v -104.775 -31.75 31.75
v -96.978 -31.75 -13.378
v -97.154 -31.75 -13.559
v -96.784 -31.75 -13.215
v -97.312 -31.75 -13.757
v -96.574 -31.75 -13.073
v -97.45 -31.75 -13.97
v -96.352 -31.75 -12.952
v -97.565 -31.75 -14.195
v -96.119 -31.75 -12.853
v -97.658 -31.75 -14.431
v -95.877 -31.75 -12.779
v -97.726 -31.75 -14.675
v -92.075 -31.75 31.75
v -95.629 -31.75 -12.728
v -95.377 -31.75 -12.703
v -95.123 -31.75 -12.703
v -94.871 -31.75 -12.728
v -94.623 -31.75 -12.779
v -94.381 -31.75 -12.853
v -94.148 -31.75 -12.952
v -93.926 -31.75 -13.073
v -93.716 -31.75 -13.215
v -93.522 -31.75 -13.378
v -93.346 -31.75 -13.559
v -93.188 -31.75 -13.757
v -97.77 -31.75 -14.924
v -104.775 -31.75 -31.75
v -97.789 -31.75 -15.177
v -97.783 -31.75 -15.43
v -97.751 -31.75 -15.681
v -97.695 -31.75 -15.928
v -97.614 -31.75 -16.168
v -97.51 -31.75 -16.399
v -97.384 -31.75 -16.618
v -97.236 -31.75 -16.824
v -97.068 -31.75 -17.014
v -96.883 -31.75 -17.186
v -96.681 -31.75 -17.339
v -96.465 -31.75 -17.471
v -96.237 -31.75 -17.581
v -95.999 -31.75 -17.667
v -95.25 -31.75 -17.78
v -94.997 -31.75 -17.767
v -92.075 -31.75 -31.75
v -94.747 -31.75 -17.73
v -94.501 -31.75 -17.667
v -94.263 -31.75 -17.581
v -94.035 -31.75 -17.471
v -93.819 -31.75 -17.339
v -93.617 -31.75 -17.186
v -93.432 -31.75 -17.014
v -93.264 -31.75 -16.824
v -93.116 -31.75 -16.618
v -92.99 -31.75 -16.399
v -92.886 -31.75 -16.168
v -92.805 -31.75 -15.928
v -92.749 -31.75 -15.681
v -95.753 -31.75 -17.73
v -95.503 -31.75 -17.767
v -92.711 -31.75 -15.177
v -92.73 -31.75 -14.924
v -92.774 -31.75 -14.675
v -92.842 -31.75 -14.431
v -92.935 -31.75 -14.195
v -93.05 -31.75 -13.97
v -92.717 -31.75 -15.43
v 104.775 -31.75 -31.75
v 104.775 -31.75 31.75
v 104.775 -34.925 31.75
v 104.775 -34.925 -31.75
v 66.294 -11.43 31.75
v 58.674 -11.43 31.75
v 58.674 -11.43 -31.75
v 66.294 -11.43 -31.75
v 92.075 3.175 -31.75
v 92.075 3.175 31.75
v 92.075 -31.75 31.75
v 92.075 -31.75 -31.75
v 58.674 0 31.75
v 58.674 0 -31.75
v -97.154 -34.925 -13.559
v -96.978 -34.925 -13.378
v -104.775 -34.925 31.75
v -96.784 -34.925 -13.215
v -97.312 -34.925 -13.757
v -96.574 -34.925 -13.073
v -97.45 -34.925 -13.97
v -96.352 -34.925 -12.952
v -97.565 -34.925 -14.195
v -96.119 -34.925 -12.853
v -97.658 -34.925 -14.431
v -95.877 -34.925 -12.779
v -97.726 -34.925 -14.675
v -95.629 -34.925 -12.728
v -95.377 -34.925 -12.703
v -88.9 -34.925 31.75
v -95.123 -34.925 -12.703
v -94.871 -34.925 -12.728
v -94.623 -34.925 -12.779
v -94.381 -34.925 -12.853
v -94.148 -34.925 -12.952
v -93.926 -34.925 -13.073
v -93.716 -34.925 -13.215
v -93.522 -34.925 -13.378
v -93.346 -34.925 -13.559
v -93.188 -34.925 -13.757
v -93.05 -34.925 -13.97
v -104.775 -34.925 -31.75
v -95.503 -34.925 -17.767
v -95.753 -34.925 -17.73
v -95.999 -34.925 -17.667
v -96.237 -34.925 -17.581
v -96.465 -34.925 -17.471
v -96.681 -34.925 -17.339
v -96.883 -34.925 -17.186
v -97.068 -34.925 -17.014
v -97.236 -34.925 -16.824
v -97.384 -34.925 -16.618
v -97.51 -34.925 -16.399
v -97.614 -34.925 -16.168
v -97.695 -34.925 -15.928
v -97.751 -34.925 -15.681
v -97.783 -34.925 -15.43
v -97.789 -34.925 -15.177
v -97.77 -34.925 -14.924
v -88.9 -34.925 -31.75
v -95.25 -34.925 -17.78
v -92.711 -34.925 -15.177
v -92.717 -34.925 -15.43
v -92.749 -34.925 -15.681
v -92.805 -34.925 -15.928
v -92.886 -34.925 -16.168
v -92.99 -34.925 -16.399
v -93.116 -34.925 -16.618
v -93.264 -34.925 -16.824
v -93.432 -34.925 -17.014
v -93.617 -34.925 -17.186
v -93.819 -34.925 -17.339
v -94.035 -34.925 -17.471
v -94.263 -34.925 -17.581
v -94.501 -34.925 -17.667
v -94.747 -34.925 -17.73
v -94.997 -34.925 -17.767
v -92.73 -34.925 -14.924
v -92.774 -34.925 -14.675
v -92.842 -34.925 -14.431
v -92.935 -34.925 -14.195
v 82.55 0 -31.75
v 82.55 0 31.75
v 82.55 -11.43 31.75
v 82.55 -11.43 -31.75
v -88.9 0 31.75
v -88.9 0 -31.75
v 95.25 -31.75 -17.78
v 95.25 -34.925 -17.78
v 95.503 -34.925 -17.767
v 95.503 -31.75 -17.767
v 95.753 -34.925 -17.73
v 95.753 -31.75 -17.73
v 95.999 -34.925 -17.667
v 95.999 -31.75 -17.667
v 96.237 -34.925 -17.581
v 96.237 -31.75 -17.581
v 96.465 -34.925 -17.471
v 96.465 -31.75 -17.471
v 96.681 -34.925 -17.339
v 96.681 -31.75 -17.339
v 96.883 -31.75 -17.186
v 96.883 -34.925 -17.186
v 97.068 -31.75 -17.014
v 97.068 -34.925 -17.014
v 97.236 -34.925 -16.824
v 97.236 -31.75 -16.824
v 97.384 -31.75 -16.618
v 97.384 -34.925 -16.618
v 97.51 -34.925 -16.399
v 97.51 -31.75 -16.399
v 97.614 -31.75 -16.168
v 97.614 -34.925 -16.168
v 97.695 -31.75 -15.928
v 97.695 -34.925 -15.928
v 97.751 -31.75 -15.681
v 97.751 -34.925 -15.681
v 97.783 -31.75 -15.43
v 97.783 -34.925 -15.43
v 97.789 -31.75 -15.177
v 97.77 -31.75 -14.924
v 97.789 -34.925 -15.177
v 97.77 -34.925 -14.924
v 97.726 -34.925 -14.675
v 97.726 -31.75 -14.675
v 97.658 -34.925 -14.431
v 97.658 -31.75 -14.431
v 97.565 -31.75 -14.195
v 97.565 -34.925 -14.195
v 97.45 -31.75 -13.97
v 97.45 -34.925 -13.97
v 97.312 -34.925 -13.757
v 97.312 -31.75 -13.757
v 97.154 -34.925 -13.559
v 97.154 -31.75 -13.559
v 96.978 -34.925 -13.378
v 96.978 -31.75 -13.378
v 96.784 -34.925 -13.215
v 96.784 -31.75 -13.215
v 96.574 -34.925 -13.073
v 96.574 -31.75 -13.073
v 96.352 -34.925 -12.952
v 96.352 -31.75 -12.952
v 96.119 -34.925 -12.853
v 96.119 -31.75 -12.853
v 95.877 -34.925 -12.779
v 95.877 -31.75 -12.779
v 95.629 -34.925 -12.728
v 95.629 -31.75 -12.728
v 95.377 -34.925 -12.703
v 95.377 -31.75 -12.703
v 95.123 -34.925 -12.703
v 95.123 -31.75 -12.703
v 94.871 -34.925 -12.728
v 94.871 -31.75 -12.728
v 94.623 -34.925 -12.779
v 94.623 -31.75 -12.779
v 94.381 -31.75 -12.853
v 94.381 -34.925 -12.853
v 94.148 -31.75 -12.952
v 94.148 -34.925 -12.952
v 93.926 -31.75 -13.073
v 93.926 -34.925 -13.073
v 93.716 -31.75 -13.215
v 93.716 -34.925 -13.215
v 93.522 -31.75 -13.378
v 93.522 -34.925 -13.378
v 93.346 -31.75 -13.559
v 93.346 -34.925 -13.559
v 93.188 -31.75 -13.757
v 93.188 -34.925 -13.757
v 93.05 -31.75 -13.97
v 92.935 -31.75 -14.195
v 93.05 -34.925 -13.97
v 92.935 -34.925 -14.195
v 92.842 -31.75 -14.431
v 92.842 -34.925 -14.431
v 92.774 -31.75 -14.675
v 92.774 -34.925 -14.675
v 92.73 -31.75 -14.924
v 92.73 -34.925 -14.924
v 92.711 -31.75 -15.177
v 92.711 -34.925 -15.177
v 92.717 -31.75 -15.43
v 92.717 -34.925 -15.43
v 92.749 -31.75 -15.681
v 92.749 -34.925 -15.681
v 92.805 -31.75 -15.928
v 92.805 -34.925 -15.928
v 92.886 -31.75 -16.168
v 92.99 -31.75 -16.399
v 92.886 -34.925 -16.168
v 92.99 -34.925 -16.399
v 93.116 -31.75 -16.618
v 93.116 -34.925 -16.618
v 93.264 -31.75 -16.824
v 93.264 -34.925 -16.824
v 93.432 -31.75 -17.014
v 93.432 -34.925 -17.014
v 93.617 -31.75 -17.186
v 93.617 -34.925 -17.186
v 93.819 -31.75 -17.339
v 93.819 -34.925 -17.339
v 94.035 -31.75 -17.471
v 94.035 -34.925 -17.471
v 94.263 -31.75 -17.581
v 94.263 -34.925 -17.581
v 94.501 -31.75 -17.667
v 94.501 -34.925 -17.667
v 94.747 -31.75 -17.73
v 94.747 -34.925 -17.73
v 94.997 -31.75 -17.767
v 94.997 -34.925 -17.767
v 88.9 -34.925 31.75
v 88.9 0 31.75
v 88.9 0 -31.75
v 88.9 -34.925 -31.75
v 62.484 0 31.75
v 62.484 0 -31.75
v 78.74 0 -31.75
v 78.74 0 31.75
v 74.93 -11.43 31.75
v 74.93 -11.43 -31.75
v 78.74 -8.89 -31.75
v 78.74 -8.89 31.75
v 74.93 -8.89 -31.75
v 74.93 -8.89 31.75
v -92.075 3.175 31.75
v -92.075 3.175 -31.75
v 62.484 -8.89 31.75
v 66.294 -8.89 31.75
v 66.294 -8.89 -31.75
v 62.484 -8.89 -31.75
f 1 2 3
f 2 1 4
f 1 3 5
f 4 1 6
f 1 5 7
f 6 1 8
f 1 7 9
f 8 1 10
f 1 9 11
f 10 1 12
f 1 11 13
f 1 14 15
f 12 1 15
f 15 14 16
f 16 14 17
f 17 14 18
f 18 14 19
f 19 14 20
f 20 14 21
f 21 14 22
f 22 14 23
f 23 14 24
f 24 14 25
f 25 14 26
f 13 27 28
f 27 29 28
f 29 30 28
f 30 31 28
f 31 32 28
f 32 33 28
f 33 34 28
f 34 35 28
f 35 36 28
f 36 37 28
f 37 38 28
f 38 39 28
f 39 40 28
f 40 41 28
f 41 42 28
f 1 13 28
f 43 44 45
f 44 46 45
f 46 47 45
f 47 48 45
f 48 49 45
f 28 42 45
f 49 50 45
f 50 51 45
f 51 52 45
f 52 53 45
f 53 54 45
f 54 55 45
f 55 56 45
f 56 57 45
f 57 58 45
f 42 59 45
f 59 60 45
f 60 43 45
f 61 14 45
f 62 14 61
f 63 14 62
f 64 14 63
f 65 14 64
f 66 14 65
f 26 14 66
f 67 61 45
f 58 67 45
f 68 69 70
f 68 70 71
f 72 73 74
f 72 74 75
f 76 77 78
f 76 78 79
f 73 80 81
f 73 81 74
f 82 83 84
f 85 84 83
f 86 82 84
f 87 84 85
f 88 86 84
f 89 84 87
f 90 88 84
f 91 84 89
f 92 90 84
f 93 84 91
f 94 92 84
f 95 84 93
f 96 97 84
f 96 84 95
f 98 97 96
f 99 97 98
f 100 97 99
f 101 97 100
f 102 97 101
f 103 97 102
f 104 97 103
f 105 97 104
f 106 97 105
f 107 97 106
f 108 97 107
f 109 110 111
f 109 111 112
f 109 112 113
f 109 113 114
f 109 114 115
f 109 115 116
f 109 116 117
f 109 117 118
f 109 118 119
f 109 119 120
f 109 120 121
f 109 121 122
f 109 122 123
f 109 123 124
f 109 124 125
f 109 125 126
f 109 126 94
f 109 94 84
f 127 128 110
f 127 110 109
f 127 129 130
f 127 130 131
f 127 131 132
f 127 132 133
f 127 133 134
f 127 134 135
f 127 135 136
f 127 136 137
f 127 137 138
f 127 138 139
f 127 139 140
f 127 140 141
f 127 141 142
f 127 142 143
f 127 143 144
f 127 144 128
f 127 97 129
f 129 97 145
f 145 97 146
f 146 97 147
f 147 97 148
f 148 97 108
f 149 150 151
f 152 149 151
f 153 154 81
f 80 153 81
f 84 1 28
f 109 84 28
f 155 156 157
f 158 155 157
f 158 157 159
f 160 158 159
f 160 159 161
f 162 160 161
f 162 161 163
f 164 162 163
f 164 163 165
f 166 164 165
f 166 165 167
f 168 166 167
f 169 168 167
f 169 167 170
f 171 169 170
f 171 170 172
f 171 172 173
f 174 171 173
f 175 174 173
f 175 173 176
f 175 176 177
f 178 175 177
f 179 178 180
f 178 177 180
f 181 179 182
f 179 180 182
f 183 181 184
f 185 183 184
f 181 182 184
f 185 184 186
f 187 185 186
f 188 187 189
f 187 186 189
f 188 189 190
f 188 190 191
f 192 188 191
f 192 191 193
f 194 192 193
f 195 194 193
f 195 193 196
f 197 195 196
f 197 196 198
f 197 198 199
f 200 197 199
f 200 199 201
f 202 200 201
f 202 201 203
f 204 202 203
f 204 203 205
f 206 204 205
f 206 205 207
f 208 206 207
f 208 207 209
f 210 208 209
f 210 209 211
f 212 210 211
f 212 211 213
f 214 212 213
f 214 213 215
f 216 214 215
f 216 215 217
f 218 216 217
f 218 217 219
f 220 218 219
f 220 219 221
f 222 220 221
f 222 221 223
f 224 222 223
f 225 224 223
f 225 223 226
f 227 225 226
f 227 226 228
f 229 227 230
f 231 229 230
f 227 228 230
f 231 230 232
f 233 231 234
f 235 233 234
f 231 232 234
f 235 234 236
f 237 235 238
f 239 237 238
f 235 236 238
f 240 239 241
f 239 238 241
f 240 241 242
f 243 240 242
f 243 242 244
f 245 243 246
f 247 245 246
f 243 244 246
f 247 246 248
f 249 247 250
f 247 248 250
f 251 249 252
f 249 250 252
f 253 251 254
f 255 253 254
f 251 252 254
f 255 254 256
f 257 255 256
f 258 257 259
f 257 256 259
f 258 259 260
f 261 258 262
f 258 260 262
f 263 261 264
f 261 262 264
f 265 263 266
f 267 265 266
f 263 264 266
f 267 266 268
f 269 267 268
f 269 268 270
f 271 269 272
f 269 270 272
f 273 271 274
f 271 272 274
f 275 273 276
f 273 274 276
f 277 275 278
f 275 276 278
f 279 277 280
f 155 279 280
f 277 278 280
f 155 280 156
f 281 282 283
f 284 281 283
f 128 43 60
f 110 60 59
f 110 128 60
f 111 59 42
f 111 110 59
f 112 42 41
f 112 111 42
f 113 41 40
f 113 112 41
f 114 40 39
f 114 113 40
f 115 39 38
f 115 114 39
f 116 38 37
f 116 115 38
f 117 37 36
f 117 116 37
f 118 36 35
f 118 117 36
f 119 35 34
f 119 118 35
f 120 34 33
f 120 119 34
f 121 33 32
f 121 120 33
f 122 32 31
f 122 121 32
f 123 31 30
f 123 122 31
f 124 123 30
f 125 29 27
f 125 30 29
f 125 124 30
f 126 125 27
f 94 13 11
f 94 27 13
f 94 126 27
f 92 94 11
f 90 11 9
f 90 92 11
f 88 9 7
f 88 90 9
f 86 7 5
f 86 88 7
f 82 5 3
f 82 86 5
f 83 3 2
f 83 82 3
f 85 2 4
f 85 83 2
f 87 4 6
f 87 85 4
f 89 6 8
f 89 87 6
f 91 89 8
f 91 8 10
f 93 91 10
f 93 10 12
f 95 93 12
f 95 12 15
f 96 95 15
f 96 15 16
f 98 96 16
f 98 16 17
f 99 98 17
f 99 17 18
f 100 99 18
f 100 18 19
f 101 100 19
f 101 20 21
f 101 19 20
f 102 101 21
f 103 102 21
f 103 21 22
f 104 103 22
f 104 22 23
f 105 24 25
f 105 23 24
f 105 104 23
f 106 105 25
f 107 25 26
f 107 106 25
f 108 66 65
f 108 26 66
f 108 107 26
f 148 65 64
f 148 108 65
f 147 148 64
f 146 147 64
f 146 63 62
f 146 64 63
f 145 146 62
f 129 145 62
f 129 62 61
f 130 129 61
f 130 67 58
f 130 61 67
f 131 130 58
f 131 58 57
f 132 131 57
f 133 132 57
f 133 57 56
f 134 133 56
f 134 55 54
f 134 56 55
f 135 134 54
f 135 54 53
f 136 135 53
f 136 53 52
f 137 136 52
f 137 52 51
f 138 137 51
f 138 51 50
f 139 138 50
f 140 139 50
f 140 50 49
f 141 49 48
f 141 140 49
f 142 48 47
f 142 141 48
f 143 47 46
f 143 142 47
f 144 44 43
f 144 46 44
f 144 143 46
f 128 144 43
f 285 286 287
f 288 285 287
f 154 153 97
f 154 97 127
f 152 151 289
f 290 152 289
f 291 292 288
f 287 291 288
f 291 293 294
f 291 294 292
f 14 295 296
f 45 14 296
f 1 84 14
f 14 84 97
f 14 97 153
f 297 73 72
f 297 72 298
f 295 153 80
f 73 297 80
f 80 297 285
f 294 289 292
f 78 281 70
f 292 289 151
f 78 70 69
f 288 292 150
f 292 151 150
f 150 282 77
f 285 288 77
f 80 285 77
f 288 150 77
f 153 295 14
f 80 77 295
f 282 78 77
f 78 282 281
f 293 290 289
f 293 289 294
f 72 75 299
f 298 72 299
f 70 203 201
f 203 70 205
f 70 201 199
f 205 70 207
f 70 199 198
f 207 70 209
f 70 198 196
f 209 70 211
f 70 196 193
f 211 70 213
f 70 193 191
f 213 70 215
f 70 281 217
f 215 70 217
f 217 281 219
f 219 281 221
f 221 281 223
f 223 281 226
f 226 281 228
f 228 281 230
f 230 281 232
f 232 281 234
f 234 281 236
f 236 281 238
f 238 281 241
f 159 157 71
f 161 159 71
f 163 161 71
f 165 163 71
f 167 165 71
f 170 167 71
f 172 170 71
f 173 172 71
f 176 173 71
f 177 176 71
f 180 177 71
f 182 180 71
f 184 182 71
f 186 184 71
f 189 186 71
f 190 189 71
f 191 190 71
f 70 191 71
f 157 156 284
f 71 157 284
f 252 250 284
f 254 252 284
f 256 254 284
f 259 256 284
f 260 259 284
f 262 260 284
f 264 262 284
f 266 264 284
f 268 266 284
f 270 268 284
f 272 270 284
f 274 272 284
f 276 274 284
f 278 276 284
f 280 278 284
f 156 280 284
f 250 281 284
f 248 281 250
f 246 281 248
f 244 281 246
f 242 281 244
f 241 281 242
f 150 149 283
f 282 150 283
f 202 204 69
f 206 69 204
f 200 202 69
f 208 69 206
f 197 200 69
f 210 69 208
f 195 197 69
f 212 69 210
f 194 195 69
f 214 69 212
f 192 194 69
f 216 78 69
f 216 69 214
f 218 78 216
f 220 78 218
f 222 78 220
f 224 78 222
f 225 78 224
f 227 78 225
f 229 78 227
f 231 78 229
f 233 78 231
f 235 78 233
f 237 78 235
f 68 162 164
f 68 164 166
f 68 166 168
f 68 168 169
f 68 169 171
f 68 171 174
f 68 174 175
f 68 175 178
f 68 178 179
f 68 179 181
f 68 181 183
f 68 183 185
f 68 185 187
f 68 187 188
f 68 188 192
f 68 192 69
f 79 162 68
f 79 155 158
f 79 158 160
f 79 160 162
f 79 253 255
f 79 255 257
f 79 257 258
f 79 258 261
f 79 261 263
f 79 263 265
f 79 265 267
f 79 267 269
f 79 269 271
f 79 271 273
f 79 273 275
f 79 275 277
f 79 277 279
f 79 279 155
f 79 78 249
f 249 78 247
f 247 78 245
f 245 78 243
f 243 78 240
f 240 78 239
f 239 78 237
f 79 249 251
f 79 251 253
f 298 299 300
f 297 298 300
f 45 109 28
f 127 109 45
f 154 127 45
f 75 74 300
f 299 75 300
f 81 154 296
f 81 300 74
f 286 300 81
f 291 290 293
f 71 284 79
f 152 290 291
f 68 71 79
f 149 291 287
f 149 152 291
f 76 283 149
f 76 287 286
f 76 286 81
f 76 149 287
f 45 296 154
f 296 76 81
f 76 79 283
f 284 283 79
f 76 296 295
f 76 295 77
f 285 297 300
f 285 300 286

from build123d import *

# Parameters (mm, degrees)
SKETCH1_W           = 177.8
SKETCH1_H           = 63.5
BOSS_EXTRUDE1_DEPTH = 3.175
SKETCH3_W           = 3.175
SKETCH3_H           = 63.5
BOSS_EXTRUDE2_DEPTH = 38.1
SKETCH4_W           = 63.5
SKETCH4_H           = 3.175
BOSS_EXTRUDE3_DEPTH = 12.7
SKETCH5_R           = 2.54
CUT_EXTRUDE1_DEPTH  = 12.7
BOSS_EXTRUDE4_DEPTH = 63.5


with BuildPart() as part:
    # Sketch1 → Boss-Extrude1 (new body)
    with BuildSketch(Plane(origin=(0, 0, 0), x_dir=(1, 0, 0), z_dir=(0, 1, 0))):
        Rectangle(SKETCH1_W, SKETCH1_H)
    extrude(amount=BOSS_EXTRUDE1_DEPTH)

    # Sketch3 → Boss-Extrude2 (add)
    with BuildSketch(Plane(origin=(0, 3.175, 0), x_dir=(1, 0, 0), z_dir=(0, 1, 0))):
        with Locations((-90.4875, 0)):
            Rectangle(SKETCH3_W, SKETCH3_H)
        with Locations((90.4875, 0)):
            Rectangle(SKETCH3_W, SKETCH3_H)
    extrude(amount=-BOSS_EXTRUDE2_DEPTH)

    # Sketch4 → Boss-Extrude3 (add)
    with BuildSketch(Plane(origin=(92.075, 0, 0), x_dir=(0, 0, -1), z_dir=(1, 0, 0))):
        with Locations((0, -33.3375)):
            Rectangle(SKETCH4_W, SKETCH4_H)
    boss_extrude3 = extrude(amount=BOSS_EXTRUDE3_DEPTH)

    # Sketch5 → Cut-Extrude1 (cut)
    with BuildSketch(Plane.XZ.offset(34.925)):
        with Locations(Location((95.25, -15.24, 0), (0, 0, 270))):
            Circle(SKETCH5_R)
    cut_extrude1 = extrude(amount=-CUT_EXTRUDE1_DEPTH, mode=Mode.SUBTRACT)

    # Mirror1: Boss-Extrude3, Cut-Extrude1 across plane
    add(boss_extrude3.mirror(Plane(origin=(0, 0, 0), x_dir=(0, 0, 1), z_dir=(1, 0, 0))))
    add(cut_extrude1.mirror(Plane(origin=(0, 0, 0), x_dir=(0, 0, 1), z_dir=(1, 0, 0))), mode=Mode.SUBTRACT)

    # Sketch6 → Boss-Extrude4 (add)
    with BuildSketch(Plane.XY.offset(31.75)):
        Polygon((58.674, 0), (58.674, -11.43), (66.294, -11.43), (66.294, -8.89), (62.484, -8.89), (62.484, 0), align=None)
        Polygon((82.55, 0), (82.55, -11.43), (74.93, -11.43), (74.93, -8.89), (78.74, -8.89), (78.74, 0), align=None)
    extrude(amount=-BOSS_EXTRUDE4_DEPTH)


solid = part.part
